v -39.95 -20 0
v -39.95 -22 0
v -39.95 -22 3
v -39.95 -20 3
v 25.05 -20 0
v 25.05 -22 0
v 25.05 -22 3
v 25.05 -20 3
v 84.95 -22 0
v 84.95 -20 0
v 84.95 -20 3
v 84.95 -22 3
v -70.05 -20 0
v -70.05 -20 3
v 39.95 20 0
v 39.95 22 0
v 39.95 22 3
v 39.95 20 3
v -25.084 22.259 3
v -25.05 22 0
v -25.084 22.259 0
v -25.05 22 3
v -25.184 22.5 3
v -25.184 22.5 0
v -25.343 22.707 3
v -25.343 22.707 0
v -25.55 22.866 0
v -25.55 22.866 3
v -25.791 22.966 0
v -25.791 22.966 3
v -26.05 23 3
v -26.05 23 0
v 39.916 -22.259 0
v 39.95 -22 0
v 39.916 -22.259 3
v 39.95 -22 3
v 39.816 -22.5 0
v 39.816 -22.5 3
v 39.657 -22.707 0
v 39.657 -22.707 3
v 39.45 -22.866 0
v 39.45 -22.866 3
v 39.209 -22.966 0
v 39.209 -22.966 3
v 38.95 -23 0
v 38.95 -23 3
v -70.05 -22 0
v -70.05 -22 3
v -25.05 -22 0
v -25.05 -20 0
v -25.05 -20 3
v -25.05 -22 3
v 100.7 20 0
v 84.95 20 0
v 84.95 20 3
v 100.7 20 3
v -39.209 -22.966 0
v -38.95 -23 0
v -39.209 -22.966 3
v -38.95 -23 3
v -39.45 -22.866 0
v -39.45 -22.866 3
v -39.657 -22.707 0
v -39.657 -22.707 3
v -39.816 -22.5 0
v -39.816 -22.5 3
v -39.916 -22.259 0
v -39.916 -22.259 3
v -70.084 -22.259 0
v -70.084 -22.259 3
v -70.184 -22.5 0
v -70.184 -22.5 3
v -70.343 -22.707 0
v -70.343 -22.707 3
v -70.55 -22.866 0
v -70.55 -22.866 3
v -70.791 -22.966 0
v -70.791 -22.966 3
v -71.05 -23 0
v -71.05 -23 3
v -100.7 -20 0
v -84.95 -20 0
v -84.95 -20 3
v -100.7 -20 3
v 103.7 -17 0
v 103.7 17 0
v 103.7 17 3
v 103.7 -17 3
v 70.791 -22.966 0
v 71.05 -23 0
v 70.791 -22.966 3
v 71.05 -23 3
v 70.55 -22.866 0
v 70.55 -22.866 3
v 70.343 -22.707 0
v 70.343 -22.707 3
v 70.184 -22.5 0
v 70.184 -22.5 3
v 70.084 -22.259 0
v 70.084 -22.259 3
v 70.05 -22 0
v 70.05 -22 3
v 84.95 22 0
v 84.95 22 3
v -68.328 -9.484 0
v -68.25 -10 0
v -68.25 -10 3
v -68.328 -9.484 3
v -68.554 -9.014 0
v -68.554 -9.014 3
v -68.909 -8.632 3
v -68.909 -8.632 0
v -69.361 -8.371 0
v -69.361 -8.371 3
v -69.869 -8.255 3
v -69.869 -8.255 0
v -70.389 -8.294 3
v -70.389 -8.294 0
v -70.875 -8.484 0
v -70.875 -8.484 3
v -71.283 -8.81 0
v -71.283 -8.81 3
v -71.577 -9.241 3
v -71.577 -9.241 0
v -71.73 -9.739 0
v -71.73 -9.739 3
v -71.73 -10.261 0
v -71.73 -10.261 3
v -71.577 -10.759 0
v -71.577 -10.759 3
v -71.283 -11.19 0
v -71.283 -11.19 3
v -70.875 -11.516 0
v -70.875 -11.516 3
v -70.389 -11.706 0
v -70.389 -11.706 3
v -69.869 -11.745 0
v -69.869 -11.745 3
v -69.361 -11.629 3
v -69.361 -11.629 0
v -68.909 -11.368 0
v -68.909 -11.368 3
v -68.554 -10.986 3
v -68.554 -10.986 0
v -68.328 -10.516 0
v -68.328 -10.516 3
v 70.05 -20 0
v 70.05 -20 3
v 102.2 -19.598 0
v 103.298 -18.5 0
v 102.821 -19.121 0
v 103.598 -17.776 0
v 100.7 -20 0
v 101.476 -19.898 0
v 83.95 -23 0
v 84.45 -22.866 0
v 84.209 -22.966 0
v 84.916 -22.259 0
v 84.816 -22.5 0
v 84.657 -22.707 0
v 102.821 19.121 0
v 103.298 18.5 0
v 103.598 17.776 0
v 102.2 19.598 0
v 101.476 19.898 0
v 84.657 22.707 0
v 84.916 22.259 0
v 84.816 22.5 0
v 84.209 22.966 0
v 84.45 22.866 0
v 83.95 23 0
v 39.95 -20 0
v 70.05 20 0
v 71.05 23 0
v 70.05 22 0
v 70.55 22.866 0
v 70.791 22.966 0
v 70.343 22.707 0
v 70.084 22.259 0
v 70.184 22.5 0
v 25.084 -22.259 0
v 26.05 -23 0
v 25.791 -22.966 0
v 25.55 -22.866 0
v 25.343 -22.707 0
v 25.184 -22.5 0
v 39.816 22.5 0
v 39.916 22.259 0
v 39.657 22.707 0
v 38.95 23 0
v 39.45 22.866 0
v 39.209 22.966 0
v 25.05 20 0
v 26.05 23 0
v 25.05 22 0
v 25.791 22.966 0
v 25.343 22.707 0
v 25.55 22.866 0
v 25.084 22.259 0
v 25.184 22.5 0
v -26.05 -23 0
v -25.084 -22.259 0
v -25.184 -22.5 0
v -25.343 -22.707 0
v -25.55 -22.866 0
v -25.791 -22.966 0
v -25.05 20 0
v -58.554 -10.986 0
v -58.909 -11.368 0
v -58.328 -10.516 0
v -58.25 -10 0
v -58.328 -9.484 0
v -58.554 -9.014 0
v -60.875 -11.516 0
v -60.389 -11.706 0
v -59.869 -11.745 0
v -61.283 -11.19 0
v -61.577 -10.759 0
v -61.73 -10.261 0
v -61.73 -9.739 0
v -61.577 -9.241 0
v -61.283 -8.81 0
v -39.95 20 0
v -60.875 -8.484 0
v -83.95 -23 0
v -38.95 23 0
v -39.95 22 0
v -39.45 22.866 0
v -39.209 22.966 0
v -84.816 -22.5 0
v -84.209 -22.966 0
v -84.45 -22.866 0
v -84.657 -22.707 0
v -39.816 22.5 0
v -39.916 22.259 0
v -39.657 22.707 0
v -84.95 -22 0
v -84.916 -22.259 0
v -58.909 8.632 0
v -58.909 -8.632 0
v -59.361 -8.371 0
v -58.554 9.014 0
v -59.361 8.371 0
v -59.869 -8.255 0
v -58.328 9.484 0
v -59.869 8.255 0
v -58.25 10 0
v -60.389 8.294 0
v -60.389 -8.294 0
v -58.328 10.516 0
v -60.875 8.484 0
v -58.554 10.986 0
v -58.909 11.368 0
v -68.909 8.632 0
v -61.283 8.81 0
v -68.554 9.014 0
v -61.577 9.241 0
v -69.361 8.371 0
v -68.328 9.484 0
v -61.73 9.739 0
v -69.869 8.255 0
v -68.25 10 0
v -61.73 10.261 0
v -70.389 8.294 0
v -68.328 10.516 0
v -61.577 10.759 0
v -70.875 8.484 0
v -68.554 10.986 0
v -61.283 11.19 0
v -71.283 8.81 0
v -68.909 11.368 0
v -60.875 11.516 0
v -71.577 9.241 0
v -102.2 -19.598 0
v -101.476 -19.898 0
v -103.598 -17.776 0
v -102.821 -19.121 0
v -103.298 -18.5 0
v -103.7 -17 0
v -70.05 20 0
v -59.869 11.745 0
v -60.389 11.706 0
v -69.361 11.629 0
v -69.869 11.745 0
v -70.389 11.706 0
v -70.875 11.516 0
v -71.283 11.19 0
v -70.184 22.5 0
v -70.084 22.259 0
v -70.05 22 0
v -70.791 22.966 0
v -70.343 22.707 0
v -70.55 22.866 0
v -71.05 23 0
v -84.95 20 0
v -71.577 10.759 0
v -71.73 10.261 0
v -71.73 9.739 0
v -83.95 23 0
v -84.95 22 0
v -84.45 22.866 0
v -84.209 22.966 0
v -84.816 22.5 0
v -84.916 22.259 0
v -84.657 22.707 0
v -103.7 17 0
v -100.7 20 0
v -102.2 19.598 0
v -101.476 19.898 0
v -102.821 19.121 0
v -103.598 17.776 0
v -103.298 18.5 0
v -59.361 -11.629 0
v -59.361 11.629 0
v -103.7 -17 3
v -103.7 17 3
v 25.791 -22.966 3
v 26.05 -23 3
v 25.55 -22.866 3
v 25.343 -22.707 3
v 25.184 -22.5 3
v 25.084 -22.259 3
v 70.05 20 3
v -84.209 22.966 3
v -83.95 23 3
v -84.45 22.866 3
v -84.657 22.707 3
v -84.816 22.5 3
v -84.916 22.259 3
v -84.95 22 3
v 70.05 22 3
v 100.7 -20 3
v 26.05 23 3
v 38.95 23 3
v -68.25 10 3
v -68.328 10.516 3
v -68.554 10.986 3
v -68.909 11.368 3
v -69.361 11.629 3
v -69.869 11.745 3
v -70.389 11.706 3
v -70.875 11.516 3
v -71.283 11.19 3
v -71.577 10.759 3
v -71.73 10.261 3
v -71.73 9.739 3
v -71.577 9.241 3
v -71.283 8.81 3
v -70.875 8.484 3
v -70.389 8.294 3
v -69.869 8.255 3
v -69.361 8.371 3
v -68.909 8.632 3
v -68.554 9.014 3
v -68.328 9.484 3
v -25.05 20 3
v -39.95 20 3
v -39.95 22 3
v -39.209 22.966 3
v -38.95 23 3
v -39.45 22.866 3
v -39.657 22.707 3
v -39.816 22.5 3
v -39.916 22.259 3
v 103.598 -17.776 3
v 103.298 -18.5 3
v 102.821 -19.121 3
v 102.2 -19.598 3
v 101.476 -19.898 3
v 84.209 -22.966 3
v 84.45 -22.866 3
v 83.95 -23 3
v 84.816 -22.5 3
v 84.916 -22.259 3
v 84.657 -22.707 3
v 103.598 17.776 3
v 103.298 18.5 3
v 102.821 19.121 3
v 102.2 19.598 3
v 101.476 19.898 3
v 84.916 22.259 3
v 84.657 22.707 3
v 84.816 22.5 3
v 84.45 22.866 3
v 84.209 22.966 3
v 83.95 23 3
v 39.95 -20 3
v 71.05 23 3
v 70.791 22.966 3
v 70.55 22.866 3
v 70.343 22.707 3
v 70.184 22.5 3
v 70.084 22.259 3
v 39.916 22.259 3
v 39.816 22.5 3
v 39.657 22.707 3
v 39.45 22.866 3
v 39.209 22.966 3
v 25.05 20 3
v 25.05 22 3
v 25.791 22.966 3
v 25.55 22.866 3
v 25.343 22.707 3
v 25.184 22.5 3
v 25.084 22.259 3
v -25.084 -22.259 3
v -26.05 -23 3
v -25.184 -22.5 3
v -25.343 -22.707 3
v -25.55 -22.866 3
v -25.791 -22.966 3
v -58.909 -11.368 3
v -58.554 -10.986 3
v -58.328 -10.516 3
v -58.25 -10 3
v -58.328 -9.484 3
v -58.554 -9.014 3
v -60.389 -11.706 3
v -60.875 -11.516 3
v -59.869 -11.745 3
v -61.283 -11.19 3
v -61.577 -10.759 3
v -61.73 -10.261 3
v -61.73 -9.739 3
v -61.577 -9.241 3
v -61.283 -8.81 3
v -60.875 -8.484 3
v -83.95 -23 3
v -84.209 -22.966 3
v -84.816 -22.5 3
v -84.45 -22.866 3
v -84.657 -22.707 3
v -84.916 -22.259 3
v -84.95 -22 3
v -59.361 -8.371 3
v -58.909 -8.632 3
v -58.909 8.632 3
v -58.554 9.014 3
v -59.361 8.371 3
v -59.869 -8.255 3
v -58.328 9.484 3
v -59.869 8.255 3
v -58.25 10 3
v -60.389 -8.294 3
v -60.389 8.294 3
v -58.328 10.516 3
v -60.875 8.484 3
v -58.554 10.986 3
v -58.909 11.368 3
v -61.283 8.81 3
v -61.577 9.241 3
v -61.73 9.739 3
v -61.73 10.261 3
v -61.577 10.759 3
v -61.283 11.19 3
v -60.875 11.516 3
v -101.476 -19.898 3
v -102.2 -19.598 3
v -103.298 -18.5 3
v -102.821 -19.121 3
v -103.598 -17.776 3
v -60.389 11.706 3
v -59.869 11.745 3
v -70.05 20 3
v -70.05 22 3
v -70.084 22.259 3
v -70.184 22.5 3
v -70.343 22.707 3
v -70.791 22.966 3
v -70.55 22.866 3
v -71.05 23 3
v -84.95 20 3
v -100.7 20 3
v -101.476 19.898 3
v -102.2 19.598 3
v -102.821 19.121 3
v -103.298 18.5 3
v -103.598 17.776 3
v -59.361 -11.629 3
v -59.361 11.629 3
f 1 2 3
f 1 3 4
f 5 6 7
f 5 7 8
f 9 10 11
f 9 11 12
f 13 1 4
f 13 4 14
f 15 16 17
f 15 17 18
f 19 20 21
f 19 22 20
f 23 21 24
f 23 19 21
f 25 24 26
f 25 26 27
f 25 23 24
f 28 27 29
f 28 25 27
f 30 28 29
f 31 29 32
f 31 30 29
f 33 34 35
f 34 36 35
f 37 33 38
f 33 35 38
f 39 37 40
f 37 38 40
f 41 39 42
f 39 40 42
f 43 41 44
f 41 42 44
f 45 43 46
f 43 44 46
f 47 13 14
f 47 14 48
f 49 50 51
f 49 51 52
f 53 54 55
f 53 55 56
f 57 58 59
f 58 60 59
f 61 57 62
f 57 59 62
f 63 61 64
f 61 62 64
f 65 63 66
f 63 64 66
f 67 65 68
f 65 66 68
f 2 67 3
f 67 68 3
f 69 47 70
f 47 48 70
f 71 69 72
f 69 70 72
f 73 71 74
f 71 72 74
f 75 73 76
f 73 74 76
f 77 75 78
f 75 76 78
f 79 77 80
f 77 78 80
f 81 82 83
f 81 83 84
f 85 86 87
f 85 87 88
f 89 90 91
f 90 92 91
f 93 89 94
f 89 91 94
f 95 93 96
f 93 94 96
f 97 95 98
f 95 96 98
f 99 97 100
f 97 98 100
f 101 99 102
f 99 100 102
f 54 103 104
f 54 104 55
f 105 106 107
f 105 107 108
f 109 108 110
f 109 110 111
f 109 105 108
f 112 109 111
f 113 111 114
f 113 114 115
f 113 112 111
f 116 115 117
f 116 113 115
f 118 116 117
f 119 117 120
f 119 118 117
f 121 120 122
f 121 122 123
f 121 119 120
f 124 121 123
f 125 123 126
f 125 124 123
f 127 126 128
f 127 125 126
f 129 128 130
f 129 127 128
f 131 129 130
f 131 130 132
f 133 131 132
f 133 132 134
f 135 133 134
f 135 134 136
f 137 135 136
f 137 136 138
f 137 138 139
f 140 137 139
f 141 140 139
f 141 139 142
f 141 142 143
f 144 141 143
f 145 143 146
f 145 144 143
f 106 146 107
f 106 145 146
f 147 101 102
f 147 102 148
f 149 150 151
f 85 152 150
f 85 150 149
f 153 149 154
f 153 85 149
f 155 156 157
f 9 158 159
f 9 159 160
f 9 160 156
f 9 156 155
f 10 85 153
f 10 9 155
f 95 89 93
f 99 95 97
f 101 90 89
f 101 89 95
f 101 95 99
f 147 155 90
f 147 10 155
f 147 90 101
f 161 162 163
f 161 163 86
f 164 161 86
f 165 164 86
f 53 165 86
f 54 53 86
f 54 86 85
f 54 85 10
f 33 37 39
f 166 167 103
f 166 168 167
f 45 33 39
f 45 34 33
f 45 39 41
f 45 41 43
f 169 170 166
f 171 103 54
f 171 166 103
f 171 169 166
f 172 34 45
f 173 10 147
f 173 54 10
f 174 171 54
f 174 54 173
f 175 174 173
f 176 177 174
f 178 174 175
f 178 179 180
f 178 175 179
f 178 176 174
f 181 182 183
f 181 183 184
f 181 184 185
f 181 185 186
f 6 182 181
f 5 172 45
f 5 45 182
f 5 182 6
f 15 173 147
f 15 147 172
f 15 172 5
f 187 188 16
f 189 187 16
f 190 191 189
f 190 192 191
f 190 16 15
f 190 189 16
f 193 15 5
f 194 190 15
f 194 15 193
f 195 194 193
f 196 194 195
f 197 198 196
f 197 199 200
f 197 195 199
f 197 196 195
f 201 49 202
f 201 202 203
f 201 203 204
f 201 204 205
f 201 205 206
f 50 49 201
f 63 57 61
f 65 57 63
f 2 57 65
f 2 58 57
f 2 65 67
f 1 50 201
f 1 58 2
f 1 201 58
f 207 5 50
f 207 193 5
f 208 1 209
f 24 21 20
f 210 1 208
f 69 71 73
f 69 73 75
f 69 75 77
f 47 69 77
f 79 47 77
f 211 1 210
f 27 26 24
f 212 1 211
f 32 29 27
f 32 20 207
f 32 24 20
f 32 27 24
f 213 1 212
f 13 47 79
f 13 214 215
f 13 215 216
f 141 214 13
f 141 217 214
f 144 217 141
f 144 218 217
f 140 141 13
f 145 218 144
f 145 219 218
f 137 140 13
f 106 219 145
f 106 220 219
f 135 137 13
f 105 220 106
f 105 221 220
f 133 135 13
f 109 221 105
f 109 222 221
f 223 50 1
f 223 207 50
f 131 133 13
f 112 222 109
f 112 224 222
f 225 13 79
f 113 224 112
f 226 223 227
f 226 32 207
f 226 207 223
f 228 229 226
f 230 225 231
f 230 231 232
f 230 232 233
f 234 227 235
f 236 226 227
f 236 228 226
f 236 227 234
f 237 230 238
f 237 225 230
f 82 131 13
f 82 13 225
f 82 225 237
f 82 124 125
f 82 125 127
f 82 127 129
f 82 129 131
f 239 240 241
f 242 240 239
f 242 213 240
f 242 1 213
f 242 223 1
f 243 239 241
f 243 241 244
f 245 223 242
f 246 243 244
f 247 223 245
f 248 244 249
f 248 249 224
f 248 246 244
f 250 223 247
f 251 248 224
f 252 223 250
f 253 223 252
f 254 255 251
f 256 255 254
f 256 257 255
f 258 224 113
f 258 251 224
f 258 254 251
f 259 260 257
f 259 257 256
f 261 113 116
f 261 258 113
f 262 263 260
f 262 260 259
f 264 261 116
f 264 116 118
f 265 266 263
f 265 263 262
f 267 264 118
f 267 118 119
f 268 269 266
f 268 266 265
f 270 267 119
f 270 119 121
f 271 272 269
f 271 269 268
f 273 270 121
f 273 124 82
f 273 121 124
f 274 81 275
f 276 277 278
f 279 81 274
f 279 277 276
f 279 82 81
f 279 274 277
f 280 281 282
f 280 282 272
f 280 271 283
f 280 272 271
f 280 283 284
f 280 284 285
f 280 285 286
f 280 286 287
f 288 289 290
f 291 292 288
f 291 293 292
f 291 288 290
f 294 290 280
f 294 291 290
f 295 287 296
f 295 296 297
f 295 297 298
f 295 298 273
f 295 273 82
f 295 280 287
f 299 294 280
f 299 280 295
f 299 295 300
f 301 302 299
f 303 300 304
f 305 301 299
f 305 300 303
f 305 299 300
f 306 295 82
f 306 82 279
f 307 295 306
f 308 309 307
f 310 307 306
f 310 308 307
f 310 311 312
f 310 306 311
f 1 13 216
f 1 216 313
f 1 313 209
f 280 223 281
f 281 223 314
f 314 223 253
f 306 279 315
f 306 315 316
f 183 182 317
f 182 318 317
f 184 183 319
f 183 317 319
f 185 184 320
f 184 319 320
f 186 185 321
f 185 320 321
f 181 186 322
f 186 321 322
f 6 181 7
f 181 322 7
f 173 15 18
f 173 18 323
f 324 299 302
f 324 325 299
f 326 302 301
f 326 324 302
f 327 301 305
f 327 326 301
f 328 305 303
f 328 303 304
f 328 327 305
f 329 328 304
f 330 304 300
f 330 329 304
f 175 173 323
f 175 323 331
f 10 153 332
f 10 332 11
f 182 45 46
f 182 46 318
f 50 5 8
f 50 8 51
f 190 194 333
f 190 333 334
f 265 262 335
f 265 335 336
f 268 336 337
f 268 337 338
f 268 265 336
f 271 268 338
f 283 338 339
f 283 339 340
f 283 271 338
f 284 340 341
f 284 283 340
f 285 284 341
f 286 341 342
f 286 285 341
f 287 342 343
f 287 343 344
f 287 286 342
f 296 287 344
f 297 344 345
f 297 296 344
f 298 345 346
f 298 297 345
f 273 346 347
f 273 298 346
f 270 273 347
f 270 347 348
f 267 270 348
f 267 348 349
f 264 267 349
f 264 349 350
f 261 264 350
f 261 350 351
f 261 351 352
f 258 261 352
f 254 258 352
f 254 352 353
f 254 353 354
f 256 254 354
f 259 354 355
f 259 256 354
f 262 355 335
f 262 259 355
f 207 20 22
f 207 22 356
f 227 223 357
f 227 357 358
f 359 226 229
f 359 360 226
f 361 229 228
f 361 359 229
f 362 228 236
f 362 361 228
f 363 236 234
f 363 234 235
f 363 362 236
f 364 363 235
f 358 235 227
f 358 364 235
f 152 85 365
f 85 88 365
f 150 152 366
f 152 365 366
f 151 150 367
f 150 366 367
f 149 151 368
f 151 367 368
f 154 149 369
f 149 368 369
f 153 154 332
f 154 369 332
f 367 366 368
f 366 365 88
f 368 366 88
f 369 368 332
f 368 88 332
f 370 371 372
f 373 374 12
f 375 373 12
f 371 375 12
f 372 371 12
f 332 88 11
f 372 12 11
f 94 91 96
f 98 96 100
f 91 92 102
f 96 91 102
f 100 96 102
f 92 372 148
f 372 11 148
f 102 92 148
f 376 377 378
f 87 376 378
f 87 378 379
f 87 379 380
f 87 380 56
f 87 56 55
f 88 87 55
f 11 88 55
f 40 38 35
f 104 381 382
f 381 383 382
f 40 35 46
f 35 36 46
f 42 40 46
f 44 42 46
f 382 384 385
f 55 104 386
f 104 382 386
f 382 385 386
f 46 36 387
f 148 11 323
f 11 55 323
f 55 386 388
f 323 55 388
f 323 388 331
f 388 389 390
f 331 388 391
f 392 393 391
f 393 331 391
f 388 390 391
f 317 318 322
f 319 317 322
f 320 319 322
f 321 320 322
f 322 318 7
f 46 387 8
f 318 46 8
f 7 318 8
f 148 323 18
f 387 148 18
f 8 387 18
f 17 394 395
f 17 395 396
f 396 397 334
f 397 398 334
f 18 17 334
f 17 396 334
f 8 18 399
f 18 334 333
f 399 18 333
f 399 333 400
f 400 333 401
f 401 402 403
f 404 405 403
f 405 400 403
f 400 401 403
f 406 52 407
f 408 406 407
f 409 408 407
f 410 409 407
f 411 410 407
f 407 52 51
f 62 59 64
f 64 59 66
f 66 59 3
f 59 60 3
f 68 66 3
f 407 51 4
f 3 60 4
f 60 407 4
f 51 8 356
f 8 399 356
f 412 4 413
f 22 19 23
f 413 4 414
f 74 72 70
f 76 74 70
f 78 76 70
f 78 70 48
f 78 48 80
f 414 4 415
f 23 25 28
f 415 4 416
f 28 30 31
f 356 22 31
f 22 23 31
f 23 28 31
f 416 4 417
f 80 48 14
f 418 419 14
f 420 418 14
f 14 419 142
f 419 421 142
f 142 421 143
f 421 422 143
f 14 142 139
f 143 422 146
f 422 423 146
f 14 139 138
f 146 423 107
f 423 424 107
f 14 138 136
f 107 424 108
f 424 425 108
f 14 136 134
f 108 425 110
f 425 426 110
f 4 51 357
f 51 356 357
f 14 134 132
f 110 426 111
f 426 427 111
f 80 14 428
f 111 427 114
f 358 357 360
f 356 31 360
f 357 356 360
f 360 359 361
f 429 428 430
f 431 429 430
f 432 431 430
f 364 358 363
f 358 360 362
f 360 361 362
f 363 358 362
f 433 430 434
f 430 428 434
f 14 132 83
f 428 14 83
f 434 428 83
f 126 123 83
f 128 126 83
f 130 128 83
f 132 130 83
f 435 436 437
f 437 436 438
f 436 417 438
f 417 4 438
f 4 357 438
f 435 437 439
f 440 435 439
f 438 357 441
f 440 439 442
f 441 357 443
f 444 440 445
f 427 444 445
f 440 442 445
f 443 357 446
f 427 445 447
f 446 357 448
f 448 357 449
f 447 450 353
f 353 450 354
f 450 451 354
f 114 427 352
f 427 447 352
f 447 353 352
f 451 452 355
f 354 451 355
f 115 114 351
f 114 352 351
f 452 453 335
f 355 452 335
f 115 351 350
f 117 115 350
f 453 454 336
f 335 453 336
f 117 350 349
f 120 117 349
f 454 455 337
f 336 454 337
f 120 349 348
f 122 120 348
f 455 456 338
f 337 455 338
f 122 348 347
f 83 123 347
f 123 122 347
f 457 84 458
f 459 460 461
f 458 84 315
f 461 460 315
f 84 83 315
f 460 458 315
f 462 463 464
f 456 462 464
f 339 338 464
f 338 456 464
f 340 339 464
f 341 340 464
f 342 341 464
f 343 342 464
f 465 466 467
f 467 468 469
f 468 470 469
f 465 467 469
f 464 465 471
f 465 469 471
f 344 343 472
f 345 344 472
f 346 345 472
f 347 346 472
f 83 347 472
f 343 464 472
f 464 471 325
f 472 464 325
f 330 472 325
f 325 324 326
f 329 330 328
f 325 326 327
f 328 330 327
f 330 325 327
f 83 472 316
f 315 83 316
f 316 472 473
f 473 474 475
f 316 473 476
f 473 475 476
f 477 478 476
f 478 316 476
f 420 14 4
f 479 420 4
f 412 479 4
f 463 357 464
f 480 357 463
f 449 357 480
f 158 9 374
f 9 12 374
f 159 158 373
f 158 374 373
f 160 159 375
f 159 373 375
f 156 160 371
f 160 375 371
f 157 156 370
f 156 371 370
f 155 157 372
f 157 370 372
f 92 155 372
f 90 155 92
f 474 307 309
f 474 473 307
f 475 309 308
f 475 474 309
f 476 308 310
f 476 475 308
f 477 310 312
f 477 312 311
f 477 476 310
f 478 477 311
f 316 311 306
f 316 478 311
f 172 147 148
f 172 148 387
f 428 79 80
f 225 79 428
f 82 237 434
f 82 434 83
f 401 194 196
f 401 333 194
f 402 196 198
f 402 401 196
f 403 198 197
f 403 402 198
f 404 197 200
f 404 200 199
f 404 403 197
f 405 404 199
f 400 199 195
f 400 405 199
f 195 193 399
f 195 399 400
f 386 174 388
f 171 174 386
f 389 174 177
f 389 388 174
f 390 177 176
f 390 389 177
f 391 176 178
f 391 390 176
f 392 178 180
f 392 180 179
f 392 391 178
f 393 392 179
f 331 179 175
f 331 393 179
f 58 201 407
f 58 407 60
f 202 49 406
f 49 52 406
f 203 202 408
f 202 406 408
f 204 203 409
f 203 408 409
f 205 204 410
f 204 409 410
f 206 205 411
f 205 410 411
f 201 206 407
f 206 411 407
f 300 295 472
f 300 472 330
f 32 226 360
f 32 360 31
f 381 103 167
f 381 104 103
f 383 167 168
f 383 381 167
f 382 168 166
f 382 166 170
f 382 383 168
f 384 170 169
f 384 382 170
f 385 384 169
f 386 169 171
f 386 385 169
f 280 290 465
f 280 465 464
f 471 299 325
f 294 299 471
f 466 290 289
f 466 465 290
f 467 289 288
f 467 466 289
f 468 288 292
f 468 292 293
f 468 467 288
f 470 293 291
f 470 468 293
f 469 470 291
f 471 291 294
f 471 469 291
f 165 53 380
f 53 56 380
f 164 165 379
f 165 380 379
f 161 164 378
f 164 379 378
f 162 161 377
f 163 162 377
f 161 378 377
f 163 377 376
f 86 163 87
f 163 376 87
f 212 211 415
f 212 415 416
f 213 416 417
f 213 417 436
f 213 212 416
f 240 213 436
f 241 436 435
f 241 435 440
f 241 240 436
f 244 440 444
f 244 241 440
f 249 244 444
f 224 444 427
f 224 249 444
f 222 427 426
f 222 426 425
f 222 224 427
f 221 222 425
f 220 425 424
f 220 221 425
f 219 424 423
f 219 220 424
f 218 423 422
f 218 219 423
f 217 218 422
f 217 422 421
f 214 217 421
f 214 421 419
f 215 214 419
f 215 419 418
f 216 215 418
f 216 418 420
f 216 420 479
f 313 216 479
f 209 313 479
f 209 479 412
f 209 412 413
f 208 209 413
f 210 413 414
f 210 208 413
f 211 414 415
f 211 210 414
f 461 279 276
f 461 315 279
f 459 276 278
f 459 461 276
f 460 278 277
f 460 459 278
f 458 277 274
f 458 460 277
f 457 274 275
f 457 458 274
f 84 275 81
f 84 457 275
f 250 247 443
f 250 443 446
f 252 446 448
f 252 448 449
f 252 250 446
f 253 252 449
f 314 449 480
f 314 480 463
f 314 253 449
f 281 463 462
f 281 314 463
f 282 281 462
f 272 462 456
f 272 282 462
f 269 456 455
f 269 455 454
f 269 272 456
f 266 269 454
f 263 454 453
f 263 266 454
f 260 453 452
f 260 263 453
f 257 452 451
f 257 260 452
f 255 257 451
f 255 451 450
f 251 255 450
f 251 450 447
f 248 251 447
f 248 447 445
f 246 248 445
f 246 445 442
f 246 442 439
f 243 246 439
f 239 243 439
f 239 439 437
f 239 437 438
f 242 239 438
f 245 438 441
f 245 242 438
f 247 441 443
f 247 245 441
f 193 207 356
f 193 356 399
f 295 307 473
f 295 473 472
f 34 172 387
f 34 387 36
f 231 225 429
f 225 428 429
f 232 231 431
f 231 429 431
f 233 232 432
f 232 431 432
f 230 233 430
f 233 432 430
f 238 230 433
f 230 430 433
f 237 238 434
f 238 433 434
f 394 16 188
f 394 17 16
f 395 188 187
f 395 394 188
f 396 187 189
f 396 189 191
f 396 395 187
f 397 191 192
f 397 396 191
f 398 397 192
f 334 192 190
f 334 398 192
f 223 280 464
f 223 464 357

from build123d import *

# Parameters (mm, degrees)
SKETCH_R    = 1.75
PAD_DEPTH   = 3
FILLET_R    = 3
FILLET001_R = 1


with BuildPart() as part:
    # Sketch → Pad (new body)
    with BuildSketch(Plane.XY):
        Polygon((25.05, 23), (39.95, 23), (39.95, 20), (70.05, 20), (70.05, 23), (84.95, 23), (84.95, 20), (103.7, 20), (103.7, -20), (84.95, -20), (84.95, -23), (70.05, -23), (70.05, -20), (39.95, -20), (39.95, -23), (25.05, -23), (25.05, -20), (-25.05, -20), (-25.05, -23), (-39.95, -23), (-39.95, -20), (-70.05, -20), (-70.05, -23), (-84.95, -23), (-84.95, -20), (-103.7, -20), (-103.7, 20), (-84.95, 20), (-84.95, 23), (-70.05, 23), (-70.05, 20), (-39.95, 20), (-39.95, 23), (-25.05, 23), (-25.05, 20), (25.05, 20), align=None)
        with Locations((-70, 10)):
            Circle(SKETCH_R, mode=Mode.SUBTRACT)
        with Locations((-60, 10)):
            Circle(SKETCH_R, mode=Mode.SUBTRACT)
        with Locations((-70, -10)):
            Circle(SKETCH_R, mode=Mode.SUBTRACT)
        with Locations((-60, -10)):
            Circle(SKETCH_R, mode=Mode.SUBTRACT)
    extrude(amount=PAD_DEPTH)

    # Fillet
    fillet_edges = [part.edges().sort_by_distance(p)[0] for p in [
        (-103.7, 20, 1.5),
        (103.7, 20, 1.5),
        (103.7, -20, 1.5),
        (-103.7, -20, 1.5),
    ]]
    fillet(fillet_edges, radius=FILLET_R)

    # Fillet001
    fillet001_edges = [part.edges().sort_by_distance(p)[0] for p in [
        (-84.95, 23, 1.5),
        (-70.05, 23, 1.5),
        (-84.95, -23, 1.5),
        (-39.95, 23, 1.5),
        (-70.05, -23, 1.5),
        (-25.05, 23, 1.5),
        (-39.95, -23, 1.5),
        (25.05, 23, 1.5),
        (-25.05, -23, 1.5),
        (39.95, 23, 1.5),
        (25.05, -23, 1.5),
        (70.05, 23, 1.5),
        (39.95, -23, 1.5),
        (84.95, 23, 1.5),
        (70.05, -23, 1.5),
        (84.95, -23, 1.5),
    ]]
    fillet(fillet001_edges, radius=FILLET001_R)


solid = part.part
